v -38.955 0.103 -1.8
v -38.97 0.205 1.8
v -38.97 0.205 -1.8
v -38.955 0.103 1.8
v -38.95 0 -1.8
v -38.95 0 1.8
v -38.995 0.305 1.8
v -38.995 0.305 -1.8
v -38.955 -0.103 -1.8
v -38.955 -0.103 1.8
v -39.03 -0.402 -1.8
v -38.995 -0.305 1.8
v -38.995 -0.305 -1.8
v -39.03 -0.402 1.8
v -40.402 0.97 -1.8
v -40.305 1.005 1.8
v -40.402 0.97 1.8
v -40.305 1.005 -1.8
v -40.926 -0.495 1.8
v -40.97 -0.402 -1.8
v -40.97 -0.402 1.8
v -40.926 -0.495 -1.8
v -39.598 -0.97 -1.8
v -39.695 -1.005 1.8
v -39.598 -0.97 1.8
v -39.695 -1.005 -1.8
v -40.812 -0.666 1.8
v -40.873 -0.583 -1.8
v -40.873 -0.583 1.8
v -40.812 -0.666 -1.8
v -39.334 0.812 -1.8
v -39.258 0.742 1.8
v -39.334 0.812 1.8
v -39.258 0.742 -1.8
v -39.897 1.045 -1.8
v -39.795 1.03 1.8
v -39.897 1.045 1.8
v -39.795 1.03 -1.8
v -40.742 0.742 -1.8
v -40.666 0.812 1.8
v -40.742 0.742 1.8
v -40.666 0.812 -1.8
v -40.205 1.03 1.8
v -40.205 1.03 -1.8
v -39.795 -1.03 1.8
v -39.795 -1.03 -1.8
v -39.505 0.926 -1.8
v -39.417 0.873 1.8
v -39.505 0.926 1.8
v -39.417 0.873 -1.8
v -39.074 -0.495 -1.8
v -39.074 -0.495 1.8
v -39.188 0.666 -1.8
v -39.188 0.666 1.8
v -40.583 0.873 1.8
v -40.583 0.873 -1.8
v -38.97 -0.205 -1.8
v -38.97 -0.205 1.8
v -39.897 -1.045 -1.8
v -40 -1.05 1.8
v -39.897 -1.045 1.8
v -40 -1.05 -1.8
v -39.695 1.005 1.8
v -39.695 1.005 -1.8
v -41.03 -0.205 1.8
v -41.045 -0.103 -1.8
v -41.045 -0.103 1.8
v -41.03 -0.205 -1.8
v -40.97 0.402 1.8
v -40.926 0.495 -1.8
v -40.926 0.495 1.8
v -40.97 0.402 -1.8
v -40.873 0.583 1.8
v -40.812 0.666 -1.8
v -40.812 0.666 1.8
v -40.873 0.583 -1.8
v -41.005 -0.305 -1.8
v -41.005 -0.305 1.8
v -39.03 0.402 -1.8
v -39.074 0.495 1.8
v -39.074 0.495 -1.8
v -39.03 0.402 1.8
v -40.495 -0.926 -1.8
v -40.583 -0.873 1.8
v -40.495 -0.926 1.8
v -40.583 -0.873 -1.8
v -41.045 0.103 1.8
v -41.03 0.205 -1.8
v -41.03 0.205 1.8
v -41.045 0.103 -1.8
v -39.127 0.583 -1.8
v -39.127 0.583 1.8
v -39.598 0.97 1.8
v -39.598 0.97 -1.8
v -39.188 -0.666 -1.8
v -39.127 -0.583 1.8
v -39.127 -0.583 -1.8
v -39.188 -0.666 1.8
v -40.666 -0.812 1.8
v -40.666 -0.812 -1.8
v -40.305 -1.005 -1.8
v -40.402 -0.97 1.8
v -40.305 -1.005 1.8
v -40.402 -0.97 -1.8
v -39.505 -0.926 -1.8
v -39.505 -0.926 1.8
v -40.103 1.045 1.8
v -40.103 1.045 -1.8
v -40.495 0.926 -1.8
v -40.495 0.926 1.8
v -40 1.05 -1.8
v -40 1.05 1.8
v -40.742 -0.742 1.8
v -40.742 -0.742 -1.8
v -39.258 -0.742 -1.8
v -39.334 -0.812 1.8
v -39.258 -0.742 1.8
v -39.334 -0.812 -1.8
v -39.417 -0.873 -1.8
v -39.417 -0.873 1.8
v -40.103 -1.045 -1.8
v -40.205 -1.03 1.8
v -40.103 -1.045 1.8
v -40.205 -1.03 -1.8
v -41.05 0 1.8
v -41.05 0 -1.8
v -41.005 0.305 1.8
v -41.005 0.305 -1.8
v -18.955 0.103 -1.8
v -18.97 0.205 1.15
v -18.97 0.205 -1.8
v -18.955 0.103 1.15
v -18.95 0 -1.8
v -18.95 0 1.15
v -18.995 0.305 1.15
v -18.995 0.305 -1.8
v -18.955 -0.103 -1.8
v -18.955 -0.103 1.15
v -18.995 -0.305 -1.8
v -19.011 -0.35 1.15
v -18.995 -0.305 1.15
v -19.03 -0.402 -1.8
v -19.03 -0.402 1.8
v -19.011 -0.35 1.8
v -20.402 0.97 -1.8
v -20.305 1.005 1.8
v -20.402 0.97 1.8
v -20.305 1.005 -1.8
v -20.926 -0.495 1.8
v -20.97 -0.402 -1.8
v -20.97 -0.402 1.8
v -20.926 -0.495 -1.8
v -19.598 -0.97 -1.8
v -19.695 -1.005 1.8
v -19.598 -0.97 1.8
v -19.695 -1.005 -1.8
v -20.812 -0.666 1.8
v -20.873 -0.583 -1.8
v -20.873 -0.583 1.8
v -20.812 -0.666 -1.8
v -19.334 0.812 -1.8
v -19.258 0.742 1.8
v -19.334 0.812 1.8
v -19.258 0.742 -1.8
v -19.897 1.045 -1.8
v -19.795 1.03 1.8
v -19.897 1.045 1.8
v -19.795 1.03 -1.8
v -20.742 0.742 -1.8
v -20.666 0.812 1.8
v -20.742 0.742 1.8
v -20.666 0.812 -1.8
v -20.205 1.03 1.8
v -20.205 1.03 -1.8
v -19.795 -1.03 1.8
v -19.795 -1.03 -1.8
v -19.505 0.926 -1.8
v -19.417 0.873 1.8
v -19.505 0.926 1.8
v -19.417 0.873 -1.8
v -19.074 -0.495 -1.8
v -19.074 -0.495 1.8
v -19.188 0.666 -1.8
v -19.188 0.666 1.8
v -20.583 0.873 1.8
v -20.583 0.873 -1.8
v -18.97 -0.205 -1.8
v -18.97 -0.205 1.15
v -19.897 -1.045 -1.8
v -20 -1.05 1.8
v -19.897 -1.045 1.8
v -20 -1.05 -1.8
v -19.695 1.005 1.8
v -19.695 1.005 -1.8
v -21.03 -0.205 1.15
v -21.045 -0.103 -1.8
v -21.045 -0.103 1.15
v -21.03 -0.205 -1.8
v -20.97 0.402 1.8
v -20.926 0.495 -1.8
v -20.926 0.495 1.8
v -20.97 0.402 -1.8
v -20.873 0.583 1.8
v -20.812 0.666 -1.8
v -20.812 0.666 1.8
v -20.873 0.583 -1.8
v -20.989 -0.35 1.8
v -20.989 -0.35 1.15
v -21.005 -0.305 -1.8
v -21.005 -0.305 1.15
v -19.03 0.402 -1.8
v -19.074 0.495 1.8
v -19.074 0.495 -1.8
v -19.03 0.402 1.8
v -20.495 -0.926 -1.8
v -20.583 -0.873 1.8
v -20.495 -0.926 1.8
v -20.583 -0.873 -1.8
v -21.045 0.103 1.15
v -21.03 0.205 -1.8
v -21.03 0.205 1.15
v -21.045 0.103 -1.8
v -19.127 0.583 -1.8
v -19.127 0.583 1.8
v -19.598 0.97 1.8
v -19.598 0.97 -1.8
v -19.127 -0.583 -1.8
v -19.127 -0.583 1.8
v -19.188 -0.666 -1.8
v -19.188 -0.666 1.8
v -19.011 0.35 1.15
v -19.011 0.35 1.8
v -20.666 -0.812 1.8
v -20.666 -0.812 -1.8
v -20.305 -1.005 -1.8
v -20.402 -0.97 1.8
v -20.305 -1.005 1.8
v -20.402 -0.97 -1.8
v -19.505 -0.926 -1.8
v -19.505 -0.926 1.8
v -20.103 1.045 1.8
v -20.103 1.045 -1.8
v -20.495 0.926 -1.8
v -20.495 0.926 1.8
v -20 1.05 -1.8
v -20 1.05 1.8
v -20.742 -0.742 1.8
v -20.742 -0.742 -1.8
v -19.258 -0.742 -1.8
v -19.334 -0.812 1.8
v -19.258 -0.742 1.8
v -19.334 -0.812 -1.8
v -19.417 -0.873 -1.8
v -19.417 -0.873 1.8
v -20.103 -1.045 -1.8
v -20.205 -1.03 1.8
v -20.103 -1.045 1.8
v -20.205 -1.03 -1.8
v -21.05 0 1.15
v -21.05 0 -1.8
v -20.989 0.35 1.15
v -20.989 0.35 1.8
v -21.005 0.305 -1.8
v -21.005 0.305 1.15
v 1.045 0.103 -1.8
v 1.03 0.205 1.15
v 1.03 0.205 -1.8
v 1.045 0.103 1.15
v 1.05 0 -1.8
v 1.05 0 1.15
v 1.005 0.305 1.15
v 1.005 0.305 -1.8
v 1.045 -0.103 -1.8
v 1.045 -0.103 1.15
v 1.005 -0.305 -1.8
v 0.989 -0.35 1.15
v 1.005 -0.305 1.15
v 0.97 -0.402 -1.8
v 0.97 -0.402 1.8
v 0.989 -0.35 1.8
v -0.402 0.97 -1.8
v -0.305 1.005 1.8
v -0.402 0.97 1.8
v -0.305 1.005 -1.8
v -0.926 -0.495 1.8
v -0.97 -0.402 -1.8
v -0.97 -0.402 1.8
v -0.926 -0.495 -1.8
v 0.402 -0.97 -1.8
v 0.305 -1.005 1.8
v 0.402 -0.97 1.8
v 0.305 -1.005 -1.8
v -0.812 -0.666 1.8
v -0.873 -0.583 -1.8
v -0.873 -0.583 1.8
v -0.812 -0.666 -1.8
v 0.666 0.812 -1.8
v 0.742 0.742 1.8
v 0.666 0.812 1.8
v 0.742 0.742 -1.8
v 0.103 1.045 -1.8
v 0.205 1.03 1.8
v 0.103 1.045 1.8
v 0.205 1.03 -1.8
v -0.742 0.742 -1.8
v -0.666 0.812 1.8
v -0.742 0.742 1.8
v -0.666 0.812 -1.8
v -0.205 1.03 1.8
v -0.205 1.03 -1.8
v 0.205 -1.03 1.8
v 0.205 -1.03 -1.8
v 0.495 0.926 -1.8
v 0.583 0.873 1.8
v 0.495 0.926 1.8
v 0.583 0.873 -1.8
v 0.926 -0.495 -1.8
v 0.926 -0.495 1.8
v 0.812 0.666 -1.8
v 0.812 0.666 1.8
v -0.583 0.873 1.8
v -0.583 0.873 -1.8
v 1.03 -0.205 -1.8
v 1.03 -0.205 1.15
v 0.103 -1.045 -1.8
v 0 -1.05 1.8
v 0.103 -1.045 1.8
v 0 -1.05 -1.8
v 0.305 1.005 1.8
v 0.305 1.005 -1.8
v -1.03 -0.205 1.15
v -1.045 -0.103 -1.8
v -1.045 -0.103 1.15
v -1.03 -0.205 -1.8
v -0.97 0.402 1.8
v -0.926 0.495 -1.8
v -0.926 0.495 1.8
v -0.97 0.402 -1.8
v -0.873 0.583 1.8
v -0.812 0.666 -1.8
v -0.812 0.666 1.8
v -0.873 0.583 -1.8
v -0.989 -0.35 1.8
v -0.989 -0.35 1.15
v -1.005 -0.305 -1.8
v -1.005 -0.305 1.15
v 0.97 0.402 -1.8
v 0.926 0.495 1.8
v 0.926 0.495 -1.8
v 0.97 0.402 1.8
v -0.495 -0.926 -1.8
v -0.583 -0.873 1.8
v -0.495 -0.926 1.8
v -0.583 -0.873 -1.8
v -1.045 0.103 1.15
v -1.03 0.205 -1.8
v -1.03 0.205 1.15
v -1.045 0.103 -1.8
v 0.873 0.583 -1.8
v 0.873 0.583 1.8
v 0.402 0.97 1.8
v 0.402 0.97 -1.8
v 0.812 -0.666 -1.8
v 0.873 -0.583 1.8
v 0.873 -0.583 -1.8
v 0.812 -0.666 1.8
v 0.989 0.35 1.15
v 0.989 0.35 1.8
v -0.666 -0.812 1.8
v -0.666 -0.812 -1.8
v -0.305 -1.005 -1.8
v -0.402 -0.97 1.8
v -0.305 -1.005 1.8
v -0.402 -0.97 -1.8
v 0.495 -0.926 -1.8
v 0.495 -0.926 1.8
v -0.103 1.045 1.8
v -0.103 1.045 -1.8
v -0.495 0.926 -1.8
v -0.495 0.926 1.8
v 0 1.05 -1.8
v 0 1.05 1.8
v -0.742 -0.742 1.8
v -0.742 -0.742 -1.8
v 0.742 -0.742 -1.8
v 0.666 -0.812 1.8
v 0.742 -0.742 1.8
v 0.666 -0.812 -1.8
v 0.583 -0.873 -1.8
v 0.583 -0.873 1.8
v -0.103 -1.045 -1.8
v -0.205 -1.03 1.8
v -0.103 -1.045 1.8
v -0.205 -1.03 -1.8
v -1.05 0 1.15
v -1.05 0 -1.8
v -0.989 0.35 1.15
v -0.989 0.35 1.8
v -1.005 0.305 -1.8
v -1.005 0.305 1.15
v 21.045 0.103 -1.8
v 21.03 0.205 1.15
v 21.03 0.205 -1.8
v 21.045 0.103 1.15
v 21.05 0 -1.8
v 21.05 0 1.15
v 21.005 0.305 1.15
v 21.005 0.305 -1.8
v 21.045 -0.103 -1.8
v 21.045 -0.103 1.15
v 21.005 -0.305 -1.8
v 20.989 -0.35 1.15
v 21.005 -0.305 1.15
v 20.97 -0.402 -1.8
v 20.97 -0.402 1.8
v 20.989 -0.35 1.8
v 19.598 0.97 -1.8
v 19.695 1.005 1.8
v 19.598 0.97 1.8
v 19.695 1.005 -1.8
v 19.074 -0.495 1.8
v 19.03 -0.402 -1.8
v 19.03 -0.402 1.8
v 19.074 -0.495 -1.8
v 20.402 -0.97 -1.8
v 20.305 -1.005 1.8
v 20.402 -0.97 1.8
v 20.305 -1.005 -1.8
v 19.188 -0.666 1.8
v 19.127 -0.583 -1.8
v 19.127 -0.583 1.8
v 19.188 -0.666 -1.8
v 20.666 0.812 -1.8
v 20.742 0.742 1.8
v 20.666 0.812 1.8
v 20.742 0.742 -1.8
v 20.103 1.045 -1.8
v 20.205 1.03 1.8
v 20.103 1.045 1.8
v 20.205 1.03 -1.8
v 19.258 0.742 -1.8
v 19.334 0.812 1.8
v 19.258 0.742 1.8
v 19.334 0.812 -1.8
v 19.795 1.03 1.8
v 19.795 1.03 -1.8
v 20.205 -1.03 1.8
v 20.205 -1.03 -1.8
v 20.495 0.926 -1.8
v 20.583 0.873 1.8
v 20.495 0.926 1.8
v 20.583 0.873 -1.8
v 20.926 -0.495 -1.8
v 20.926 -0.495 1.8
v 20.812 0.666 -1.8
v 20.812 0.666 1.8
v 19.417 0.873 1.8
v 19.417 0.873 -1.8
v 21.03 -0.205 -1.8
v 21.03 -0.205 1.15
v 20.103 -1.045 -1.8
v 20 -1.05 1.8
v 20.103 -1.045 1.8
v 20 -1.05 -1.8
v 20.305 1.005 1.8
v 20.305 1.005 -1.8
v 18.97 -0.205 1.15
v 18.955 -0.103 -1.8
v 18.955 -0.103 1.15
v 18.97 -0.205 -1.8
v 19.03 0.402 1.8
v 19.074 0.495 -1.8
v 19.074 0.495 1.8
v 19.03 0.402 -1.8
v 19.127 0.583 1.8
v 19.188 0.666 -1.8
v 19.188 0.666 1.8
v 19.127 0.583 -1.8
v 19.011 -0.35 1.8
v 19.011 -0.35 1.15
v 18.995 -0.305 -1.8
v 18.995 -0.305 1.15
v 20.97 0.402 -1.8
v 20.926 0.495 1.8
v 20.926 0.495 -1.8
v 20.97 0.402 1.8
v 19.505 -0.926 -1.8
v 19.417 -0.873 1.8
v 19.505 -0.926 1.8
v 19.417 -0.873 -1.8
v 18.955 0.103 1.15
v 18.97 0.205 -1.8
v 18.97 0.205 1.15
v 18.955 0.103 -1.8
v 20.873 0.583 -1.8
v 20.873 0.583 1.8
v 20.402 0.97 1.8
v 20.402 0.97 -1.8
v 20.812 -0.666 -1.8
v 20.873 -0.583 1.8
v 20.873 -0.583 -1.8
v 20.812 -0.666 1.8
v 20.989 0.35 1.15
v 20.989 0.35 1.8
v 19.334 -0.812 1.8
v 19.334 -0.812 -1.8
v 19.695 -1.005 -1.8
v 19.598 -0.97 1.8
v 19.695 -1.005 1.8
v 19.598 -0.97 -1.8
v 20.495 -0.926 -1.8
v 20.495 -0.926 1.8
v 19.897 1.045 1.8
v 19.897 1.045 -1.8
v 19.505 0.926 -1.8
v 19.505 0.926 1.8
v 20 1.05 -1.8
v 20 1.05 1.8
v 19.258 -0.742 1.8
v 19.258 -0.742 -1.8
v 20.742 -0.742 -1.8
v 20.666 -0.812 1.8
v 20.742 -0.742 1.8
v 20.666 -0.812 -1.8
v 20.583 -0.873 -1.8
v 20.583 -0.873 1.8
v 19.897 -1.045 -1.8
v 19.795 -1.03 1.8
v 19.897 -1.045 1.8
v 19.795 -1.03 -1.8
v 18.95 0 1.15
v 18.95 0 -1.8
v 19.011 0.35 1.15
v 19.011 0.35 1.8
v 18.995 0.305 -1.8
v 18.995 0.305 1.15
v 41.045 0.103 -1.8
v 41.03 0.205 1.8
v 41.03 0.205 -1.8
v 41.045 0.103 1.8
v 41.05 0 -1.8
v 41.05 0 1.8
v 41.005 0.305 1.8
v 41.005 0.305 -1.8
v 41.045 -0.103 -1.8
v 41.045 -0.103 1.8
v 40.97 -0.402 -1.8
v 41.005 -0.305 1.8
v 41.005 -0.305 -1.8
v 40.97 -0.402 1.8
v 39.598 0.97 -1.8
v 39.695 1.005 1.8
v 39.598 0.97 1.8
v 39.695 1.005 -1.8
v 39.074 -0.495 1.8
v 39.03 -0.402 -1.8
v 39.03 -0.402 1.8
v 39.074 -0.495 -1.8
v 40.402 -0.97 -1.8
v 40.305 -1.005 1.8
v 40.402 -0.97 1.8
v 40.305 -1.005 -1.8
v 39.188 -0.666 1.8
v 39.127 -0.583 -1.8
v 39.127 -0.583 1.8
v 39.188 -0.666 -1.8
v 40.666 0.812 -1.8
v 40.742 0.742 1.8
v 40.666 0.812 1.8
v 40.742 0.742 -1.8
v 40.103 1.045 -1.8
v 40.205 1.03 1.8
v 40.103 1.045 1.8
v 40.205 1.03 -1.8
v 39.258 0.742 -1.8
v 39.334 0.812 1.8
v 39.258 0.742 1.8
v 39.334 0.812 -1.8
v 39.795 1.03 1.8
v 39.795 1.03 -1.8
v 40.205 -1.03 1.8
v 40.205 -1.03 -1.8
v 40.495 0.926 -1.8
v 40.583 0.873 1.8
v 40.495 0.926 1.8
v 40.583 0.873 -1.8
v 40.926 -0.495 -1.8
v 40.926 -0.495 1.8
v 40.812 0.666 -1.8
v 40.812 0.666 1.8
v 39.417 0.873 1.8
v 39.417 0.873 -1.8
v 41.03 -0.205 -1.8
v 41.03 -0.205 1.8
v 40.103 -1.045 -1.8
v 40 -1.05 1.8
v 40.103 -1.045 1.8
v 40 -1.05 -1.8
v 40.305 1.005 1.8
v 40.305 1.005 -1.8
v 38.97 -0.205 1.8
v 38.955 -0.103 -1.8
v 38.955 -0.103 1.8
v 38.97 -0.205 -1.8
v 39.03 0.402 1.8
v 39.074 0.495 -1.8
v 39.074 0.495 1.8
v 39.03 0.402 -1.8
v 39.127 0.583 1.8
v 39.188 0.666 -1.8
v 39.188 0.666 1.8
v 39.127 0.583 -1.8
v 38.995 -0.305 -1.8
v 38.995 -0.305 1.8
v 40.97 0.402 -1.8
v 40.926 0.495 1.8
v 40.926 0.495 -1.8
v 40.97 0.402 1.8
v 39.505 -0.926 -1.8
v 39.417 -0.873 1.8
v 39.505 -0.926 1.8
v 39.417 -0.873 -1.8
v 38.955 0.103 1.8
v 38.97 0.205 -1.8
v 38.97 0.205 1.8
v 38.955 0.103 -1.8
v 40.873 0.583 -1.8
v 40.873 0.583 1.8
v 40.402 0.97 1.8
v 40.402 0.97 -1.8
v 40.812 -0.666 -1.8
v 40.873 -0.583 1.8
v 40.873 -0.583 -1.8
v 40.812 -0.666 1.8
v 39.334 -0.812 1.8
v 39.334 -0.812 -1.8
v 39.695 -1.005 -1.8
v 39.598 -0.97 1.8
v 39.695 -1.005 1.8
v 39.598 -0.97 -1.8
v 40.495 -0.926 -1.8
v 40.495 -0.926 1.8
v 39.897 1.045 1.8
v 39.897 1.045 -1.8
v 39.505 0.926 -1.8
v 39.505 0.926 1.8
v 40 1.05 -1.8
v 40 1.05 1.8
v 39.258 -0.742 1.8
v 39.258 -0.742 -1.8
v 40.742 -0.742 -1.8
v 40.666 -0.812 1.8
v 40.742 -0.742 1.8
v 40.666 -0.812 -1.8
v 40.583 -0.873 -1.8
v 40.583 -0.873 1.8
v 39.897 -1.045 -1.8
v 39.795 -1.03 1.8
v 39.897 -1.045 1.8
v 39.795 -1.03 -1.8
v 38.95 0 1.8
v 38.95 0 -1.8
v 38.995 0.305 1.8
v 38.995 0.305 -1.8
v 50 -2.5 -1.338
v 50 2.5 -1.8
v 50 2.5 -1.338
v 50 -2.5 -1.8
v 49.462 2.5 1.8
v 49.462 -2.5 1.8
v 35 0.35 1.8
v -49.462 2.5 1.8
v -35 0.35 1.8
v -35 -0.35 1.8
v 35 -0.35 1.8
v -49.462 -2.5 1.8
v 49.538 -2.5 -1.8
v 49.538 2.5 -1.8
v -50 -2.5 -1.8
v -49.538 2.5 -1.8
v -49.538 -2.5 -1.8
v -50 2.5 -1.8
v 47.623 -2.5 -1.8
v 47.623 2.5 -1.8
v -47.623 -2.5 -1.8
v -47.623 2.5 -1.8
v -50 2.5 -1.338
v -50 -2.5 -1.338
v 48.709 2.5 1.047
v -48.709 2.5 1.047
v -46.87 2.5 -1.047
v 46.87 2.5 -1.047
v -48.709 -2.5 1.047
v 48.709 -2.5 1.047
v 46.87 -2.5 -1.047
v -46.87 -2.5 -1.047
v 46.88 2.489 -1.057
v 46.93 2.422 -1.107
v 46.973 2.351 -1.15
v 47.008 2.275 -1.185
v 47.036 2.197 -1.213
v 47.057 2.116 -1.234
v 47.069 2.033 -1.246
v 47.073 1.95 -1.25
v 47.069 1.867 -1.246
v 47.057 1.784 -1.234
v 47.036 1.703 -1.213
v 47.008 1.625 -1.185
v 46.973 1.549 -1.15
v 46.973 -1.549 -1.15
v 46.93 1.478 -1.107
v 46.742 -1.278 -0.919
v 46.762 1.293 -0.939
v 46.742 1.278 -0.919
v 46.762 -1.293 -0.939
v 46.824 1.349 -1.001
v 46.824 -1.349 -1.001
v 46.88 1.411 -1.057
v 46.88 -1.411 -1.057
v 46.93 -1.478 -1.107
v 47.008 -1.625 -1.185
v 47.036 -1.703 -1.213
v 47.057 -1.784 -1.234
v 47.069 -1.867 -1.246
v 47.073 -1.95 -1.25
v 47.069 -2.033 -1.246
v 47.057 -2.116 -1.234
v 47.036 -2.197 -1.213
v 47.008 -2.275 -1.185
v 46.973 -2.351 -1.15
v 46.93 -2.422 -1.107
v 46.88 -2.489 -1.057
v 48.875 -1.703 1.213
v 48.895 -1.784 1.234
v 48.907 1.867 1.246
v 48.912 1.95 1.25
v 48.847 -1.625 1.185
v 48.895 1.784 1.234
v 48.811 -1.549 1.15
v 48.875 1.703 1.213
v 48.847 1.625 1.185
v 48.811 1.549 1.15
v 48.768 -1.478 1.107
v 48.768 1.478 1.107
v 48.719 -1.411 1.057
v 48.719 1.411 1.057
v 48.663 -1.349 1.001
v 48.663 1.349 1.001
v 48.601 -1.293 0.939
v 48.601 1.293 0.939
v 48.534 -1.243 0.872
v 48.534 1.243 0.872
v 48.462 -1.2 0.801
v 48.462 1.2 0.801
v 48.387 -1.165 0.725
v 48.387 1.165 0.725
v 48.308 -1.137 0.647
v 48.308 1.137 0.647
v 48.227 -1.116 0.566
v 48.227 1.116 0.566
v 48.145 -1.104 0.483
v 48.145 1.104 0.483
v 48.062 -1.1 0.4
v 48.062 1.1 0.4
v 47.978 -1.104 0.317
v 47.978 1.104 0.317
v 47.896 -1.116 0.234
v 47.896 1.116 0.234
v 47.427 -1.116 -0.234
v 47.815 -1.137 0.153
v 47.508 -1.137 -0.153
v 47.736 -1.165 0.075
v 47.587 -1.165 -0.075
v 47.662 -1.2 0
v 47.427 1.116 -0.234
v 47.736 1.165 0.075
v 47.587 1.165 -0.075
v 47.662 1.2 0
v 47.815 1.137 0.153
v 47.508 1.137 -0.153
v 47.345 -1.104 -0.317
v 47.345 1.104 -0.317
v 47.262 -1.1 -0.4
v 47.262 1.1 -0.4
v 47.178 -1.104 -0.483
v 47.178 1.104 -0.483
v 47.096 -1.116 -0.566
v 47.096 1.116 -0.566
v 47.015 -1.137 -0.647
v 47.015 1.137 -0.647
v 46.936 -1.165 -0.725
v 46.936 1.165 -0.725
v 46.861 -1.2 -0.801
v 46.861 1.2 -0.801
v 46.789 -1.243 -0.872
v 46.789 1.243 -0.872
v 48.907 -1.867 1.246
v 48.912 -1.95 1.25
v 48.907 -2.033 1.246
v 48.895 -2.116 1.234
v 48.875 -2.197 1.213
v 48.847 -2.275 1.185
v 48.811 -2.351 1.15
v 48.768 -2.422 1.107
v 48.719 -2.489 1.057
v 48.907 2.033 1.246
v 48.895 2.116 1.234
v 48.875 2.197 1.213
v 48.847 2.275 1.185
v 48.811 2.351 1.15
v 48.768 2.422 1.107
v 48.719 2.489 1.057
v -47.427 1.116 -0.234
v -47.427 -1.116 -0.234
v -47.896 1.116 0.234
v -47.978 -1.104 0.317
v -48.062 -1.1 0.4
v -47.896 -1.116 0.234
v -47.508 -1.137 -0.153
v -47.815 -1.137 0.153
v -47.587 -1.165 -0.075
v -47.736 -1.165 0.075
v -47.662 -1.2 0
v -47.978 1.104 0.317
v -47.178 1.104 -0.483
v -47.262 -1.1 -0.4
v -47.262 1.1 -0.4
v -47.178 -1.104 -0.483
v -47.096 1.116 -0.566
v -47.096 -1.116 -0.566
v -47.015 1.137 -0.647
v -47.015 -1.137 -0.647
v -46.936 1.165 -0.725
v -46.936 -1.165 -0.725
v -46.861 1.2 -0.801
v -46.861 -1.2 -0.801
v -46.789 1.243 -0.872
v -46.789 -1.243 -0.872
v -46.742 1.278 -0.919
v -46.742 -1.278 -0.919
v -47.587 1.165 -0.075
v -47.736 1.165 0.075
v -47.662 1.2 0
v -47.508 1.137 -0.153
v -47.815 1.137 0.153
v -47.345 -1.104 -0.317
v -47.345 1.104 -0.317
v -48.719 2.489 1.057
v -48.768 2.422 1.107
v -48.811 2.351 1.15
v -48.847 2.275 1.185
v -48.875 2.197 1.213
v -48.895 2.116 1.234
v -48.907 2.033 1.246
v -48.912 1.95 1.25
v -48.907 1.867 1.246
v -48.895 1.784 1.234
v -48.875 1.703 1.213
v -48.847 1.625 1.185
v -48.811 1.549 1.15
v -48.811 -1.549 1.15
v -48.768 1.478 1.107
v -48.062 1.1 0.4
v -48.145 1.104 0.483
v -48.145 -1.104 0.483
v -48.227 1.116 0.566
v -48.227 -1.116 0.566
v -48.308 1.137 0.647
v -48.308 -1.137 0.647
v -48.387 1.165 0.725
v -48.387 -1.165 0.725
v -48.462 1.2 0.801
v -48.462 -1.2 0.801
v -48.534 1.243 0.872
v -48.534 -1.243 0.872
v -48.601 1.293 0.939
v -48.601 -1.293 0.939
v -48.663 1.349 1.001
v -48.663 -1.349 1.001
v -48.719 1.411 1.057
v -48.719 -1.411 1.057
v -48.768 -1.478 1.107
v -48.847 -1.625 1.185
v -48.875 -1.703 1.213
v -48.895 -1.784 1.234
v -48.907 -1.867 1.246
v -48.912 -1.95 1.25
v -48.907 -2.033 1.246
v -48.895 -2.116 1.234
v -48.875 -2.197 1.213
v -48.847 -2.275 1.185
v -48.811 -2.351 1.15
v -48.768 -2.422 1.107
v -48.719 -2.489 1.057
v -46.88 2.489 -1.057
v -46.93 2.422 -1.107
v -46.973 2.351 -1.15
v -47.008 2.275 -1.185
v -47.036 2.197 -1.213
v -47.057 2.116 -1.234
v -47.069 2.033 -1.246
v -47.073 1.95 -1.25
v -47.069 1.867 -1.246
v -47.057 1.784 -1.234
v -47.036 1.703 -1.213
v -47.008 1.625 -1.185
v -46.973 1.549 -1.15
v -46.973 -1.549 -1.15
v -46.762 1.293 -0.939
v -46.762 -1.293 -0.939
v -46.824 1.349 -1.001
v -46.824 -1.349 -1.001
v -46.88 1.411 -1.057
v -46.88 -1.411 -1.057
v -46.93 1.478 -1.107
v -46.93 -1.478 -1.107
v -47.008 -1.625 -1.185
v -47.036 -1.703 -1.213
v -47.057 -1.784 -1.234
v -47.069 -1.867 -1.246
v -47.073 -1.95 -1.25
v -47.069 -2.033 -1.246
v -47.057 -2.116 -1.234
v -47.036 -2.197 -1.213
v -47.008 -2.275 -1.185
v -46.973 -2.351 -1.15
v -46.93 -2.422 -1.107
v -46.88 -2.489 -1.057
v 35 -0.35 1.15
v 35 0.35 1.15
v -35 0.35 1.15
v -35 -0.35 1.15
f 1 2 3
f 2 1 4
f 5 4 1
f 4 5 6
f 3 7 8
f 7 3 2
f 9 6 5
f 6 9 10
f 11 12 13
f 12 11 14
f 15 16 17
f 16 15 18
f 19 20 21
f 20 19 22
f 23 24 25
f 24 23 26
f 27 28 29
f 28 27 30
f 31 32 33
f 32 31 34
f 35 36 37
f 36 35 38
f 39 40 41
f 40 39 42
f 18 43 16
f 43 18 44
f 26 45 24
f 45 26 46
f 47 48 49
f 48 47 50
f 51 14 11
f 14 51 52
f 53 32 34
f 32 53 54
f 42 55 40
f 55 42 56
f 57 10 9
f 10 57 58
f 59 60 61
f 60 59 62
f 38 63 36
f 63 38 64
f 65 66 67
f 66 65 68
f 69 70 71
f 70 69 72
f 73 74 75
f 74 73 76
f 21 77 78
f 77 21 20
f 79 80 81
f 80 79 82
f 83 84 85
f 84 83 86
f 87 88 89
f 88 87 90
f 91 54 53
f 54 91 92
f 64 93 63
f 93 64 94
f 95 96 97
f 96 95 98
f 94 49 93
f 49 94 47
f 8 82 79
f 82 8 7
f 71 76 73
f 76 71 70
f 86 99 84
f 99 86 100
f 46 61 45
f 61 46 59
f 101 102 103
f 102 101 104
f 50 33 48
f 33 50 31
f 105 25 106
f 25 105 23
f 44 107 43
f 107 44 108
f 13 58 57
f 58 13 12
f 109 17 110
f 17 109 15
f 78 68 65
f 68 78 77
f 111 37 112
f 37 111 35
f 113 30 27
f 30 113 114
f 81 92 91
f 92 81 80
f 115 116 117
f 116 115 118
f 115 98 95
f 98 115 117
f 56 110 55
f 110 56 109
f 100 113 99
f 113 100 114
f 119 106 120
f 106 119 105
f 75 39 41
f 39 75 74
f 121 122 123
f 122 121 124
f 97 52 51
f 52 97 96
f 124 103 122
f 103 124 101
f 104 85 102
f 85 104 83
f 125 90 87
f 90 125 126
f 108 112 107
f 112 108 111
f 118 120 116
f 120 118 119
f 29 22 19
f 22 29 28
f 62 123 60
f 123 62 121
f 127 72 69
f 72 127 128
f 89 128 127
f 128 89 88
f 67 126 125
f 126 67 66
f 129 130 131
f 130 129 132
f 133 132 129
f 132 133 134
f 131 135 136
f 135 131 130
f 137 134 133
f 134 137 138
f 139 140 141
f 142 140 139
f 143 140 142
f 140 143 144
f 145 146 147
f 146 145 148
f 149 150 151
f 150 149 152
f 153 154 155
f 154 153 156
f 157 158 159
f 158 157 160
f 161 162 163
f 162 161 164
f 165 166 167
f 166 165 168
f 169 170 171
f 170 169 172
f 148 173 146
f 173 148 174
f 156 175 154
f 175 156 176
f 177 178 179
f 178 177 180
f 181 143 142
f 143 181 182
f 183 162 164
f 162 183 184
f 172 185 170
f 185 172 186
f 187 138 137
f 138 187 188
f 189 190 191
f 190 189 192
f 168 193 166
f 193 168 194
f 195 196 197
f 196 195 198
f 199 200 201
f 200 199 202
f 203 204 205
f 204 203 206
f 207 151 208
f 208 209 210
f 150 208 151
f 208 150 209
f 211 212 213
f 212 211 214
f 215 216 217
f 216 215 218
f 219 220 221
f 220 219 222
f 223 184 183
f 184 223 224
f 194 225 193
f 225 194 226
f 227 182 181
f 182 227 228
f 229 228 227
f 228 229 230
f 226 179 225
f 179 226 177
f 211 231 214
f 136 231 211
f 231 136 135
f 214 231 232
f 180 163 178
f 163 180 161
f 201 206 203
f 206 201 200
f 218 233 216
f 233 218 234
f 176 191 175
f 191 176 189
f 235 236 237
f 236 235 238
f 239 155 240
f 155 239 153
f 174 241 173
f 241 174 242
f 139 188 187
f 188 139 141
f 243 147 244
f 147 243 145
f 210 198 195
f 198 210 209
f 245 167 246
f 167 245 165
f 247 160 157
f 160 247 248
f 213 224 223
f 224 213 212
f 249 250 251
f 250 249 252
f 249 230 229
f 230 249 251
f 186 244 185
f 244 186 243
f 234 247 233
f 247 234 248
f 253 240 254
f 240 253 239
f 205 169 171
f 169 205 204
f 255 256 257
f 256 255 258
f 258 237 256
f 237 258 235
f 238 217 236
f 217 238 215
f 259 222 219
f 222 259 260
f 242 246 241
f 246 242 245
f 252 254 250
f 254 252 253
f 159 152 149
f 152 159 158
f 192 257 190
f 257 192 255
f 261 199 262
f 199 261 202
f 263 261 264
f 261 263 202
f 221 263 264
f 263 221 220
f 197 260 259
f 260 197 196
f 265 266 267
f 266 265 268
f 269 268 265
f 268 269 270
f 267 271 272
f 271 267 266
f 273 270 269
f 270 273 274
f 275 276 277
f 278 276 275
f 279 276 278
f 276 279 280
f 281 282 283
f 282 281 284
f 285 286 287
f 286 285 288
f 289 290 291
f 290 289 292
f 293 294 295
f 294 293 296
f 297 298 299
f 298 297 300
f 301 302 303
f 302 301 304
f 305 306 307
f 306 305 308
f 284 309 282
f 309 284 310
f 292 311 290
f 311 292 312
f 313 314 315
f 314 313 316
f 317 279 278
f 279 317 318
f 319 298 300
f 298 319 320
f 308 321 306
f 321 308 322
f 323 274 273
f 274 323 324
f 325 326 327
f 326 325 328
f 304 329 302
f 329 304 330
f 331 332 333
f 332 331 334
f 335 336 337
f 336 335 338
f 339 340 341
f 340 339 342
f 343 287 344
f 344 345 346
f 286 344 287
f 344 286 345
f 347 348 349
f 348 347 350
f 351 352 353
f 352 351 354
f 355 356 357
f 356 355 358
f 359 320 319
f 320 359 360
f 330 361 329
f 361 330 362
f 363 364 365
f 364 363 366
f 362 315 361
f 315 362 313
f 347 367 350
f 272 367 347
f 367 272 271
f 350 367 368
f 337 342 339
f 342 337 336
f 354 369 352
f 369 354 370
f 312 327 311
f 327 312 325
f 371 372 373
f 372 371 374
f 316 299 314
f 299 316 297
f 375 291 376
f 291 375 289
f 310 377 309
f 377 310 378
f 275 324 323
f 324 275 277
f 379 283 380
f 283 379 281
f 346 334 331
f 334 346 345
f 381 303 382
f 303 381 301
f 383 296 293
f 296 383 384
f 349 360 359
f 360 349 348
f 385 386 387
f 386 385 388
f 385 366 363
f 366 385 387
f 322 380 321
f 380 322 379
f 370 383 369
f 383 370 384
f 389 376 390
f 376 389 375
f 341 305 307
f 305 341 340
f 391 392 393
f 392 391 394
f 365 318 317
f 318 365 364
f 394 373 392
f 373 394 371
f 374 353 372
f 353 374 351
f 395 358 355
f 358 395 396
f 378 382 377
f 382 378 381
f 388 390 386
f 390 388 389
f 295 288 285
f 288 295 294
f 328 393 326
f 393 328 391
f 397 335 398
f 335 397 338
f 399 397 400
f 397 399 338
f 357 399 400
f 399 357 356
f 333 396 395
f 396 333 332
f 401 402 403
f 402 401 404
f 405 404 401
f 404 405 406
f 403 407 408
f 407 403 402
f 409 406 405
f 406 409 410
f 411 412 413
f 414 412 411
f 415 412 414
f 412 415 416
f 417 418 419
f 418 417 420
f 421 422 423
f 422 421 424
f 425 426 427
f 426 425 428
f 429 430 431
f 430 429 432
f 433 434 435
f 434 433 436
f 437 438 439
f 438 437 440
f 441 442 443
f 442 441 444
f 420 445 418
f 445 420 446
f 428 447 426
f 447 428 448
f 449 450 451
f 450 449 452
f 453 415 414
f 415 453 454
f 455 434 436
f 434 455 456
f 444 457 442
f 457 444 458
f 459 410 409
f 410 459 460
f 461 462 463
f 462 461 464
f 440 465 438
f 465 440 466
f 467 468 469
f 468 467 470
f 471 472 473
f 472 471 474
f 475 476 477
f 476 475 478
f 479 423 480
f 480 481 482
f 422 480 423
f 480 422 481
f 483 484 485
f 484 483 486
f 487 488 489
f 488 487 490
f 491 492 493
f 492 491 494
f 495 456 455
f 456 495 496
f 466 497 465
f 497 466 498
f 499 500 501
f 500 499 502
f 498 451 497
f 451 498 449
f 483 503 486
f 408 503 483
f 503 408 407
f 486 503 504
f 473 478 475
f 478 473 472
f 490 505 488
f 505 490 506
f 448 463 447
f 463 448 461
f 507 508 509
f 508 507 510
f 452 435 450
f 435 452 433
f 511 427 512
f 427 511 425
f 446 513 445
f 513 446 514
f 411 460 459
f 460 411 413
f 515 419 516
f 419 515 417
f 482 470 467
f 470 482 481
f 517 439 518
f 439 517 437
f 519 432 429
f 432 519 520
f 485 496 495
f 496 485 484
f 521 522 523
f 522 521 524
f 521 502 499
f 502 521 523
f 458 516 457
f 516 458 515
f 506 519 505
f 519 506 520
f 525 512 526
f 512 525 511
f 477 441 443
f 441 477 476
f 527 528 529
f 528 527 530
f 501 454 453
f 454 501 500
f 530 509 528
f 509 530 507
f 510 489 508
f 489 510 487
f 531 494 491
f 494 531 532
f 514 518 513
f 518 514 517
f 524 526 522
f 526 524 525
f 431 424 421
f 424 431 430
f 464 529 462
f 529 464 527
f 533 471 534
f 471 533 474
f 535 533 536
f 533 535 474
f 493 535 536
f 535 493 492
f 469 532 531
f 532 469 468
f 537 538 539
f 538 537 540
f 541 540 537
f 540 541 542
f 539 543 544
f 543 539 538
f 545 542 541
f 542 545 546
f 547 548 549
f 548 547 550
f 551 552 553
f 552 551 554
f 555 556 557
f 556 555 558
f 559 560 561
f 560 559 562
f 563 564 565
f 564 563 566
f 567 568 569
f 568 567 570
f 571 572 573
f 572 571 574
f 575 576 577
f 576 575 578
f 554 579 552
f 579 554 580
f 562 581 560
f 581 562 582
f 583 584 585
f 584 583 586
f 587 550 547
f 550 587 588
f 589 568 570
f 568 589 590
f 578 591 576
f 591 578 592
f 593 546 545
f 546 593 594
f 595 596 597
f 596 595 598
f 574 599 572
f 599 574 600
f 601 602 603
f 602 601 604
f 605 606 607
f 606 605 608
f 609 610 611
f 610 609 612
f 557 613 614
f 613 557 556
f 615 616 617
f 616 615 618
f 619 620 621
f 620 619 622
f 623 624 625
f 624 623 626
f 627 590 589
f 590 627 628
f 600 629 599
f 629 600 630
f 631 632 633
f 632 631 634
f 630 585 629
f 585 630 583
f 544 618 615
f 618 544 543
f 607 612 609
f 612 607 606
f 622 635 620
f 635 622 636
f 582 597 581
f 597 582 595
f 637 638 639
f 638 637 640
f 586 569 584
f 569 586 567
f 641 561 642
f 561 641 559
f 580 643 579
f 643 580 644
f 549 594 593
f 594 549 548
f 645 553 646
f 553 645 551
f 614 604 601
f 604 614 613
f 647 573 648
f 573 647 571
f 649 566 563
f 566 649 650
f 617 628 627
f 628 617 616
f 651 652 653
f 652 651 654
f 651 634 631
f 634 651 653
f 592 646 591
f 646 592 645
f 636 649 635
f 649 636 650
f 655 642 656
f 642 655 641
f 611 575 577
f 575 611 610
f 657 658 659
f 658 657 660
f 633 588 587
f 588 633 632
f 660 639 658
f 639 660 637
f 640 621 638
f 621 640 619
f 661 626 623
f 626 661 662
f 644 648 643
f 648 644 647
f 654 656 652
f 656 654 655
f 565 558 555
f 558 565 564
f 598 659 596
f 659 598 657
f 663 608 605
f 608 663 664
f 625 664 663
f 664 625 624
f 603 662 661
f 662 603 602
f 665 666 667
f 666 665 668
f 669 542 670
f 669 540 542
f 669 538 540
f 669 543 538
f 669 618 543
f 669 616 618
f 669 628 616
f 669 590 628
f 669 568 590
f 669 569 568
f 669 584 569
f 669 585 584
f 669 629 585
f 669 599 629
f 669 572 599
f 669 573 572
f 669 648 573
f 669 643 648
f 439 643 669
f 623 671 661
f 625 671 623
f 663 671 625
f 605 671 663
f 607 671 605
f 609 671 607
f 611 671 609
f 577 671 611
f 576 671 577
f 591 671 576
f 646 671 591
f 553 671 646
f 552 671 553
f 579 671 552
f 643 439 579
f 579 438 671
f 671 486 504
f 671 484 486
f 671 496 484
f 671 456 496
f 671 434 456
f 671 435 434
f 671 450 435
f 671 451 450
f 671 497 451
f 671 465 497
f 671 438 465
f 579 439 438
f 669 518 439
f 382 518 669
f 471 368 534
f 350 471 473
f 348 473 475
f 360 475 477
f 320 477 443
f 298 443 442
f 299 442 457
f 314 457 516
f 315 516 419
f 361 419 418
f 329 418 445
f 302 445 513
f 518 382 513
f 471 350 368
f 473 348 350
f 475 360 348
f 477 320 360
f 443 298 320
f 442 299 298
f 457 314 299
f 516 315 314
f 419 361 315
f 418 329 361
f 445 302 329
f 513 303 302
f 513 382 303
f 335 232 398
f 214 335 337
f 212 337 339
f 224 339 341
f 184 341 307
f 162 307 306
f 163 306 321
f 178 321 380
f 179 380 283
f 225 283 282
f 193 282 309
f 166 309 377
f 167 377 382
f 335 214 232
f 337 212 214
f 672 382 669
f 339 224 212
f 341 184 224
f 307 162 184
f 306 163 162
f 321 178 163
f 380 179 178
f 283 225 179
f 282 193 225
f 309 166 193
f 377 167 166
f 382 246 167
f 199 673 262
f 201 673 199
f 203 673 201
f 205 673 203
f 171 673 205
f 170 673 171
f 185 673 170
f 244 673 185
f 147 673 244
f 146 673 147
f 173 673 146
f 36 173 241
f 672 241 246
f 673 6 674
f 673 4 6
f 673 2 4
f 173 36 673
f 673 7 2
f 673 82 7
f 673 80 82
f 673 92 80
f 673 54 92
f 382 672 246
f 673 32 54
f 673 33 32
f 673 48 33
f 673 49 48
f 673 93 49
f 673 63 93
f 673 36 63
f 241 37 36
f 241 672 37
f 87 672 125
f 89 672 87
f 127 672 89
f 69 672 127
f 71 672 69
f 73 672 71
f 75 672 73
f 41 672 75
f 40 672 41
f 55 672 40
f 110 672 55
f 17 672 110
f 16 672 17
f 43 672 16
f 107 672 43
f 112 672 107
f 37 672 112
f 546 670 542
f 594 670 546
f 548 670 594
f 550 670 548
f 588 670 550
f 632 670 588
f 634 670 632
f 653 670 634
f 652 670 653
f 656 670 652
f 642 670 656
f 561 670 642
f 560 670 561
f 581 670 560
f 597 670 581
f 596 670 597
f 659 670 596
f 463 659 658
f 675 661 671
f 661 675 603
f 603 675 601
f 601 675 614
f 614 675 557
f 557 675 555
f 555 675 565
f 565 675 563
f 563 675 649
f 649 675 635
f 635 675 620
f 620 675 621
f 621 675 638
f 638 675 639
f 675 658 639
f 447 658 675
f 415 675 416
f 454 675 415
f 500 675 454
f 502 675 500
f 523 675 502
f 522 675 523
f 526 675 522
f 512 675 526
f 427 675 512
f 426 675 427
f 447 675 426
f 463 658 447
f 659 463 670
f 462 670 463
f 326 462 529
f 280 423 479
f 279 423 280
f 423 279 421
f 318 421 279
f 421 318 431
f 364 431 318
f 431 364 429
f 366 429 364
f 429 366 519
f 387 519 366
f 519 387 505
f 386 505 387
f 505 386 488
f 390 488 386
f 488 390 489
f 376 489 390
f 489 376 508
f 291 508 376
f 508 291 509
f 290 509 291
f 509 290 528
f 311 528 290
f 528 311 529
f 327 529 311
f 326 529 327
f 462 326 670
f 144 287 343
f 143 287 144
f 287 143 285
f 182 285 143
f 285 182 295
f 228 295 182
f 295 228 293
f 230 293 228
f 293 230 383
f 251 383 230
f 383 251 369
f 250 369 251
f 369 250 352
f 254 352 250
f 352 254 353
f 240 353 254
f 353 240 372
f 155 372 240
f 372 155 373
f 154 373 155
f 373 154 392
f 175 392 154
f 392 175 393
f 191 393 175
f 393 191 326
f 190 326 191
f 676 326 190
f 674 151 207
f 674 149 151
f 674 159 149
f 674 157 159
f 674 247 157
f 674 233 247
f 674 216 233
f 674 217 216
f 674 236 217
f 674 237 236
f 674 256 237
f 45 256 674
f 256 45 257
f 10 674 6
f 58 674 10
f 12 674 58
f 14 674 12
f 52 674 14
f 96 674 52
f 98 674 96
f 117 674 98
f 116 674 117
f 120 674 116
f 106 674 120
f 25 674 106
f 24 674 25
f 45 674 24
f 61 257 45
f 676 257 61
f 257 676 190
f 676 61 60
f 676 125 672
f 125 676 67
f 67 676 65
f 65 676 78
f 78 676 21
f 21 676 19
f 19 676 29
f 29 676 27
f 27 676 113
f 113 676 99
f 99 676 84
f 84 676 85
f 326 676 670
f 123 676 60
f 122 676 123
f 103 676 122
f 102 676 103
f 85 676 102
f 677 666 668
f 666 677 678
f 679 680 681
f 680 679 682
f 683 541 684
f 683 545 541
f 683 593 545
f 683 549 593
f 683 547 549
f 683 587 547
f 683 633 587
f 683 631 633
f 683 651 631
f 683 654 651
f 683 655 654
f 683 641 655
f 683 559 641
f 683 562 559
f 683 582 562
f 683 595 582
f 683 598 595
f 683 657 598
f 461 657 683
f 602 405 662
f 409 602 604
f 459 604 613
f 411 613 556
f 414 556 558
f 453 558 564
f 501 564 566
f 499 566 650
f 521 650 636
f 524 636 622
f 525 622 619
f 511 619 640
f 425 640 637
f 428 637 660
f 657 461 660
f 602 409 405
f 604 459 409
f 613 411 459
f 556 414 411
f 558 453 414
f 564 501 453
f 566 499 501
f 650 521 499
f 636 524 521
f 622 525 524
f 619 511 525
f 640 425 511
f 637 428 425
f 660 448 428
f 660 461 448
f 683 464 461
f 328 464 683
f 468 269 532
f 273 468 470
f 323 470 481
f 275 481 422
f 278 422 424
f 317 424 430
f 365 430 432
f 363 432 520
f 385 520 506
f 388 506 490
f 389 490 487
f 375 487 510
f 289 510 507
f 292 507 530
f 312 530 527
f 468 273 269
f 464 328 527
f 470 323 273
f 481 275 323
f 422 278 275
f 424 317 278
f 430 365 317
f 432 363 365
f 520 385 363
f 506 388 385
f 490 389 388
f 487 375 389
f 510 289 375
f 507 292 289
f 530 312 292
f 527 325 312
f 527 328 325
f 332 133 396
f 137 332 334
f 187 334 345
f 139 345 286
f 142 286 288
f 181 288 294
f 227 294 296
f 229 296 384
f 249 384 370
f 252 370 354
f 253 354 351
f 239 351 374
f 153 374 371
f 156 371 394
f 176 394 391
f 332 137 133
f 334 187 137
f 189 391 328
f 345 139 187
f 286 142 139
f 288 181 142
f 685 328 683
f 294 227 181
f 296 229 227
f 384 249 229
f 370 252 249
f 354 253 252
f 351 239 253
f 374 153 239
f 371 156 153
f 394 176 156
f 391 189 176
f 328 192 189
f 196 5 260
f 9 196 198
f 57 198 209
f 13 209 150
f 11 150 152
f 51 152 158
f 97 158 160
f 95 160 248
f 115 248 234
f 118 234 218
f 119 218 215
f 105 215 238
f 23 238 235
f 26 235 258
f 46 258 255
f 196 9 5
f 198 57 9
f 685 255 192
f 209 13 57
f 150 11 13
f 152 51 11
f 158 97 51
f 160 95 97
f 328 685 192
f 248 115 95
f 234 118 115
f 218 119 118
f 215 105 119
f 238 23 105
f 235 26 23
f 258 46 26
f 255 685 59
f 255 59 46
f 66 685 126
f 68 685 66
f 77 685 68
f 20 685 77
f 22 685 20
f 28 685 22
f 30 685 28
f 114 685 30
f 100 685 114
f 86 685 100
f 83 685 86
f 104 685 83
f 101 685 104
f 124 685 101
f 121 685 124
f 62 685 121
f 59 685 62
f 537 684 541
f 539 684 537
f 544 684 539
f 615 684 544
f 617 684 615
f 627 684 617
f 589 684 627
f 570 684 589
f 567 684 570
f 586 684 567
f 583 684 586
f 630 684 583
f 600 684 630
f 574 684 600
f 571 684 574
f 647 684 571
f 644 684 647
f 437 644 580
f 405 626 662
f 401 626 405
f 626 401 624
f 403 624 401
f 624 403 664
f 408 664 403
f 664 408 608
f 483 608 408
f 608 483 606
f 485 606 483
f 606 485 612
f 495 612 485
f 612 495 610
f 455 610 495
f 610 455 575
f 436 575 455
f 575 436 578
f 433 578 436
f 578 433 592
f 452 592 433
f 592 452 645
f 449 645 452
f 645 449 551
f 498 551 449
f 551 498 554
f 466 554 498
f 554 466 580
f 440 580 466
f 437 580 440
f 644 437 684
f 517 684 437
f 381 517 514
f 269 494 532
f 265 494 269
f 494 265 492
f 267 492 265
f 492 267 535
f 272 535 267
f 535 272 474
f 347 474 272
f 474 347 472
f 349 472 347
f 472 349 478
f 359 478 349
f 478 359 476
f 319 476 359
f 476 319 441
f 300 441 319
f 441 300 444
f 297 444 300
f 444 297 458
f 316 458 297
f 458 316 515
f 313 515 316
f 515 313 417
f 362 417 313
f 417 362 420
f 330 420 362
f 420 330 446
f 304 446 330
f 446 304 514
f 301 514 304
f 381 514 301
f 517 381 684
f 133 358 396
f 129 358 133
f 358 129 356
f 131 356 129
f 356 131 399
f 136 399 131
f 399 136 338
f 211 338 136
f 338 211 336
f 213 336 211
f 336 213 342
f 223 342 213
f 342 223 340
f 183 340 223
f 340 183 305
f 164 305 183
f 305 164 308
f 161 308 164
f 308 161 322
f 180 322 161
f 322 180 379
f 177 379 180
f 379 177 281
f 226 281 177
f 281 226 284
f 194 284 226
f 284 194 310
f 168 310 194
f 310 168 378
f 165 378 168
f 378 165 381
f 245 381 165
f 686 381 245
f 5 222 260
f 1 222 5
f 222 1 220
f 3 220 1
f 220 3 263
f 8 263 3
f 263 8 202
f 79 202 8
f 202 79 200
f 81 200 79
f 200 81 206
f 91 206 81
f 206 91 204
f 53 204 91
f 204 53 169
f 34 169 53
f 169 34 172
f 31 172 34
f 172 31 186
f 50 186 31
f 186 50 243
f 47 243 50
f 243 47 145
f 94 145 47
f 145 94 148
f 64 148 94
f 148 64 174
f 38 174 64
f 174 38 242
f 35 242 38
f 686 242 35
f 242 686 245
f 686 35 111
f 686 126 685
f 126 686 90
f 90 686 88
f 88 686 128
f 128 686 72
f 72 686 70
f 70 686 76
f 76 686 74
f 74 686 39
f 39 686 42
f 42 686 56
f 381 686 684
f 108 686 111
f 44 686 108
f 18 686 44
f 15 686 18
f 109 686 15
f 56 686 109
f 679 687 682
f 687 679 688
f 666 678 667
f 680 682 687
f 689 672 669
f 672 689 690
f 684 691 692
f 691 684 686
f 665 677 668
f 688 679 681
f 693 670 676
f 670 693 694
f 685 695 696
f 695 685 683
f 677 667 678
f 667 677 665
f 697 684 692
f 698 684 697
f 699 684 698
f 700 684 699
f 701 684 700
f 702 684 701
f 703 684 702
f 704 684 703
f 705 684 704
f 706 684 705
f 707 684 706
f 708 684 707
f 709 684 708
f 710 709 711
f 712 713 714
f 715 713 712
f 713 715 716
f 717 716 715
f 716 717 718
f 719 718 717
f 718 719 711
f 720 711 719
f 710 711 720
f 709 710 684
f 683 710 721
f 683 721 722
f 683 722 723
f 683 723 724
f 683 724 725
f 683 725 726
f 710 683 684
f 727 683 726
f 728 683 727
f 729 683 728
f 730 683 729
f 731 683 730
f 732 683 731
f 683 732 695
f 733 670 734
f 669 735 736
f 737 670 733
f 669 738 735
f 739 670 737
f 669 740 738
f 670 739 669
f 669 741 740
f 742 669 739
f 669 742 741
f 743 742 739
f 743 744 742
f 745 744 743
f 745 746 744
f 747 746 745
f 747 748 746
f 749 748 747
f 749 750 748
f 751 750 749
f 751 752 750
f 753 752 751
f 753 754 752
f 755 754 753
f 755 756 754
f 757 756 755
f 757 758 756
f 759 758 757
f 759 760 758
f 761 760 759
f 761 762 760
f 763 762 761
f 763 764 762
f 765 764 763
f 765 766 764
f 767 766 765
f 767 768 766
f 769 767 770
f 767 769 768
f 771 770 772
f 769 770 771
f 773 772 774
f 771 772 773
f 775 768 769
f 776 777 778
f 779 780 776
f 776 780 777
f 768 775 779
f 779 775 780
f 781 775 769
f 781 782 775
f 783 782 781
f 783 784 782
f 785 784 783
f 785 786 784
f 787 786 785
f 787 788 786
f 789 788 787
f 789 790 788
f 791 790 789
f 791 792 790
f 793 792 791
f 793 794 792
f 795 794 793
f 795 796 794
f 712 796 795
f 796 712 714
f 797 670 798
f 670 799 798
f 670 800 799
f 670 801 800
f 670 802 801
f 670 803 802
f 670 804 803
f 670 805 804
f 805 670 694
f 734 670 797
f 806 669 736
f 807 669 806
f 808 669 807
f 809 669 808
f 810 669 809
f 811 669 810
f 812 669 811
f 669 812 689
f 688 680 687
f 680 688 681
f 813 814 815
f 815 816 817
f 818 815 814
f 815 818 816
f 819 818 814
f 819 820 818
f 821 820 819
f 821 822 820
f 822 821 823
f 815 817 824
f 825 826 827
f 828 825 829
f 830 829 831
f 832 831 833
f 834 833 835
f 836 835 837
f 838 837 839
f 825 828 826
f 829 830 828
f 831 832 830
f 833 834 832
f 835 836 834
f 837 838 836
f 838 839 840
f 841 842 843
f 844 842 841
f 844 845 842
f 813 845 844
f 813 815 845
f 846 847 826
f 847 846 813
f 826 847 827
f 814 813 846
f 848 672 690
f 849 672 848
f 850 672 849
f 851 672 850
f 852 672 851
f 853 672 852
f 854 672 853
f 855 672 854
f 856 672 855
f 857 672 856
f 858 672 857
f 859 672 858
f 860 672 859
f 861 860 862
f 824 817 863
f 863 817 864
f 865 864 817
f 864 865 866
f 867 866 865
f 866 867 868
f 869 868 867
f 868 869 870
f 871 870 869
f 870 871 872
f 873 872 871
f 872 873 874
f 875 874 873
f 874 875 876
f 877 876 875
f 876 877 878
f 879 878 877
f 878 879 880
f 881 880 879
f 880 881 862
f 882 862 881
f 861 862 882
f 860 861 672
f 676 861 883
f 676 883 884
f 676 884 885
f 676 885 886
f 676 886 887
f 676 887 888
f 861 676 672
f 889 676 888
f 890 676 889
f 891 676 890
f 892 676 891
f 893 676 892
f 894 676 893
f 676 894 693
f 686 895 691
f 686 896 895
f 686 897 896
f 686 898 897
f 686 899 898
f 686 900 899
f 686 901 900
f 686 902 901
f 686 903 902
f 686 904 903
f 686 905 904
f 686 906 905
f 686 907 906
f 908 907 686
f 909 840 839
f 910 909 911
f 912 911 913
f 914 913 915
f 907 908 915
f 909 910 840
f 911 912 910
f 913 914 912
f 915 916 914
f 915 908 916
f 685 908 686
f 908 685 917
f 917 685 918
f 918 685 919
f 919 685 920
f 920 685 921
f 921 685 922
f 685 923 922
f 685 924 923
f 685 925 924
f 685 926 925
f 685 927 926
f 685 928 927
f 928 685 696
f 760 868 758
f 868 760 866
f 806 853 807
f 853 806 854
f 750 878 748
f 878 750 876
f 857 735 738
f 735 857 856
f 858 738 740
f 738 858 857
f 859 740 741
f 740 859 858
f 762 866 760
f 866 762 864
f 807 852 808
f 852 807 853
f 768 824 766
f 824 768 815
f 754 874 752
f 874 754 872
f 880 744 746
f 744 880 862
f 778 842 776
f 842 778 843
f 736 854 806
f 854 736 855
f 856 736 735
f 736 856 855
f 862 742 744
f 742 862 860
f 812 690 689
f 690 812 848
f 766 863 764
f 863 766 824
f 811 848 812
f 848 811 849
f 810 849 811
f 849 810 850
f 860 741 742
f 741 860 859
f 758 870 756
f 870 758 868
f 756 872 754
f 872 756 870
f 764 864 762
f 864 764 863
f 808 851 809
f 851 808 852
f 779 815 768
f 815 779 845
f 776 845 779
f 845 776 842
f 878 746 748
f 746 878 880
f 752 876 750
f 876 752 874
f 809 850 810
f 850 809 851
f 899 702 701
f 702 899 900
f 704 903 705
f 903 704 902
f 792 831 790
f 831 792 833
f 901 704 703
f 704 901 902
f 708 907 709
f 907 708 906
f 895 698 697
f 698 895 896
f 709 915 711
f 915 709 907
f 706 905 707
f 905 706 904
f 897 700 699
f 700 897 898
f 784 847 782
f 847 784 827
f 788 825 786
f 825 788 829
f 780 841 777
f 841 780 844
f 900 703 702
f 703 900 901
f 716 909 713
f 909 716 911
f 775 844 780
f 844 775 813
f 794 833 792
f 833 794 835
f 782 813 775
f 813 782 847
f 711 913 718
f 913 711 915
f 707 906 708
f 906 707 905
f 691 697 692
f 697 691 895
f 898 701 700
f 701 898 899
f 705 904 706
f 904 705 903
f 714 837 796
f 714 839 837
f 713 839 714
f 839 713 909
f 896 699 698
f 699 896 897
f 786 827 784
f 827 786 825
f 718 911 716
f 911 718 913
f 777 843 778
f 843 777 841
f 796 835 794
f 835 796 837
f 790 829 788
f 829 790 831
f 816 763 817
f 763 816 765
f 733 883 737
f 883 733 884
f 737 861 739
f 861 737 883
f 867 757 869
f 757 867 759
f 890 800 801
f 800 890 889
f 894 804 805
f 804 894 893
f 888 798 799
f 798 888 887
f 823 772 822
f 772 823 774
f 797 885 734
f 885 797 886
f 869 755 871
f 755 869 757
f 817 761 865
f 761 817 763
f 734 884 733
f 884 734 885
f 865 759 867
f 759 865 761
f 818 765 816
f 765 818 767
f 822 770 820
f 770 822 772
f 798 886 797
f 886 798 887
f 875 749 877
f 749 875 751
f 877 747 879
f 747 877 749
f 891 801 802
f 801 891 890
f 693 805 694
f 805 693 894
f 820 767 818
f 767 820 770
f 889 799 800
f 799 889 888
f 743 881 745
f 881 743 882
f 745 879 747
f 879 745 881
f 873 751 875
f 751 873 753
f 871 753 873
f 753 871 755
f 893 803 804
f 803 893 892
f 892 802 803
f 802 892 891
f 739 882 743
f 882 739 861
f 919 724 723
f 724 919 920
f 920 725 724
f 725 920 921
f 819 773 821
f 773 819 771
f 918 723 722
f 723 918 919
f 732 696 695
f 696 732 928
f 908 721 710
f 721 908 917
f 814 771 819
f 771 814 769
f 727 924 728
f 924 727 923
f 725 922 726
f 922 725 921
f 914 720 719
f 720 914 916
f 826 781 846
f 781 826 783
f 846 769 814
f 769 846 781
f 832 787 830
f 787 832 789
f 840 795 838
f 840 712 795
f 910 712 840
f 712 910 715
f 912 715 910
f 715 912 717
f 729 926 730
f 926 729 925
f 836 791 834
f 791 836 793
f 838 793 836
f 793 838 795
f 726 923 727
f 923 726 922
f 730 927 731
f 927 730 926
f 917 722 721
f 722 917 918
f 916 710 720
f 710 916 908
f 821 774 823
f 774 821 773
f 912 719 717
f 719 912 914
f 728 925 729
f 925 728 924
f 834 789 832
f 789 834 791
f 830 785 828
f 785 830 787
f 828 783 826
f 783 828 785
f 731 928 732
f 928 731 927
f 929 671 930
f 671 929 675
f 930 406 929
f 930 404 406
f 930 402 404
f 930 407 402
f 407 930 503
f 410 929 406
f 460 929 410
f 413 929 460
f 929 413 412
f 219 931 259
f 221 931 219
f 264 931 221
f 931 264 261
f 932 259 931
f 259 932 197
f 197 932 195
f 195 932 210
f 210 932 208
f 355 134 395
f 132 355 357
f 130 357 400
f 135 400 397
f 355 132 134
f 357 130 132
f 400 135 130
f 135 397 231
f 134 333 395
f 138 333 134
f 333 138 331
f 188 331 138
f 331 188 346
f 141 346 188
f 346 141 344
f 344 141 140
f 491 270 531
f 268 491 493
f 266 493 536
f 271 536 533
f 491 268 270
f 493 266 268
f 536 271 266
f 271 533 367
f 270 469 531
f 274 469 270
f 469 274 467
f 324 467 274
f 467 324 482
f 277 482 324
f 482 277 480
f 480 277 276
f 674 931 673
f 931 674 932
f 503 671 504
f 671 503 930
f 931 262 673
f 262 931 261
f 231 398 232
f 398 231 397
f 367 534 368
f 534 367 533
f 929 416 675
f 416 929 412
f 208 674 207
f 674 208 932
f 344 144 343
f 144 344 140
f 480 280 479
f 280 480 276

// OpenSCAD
// Miniature linear guide rail (single connected solid)
// Target overall size: 100.0mm (L) x 5.0mm (W) x 3.6mm (H)

$fn = 64;

// Parameters
rail_L = 100.0; //[50.0:200.0:1]
rail_W = 5.0;   //[2.5:10.0:0.1]
rail_H = 3.6;   //[1.8:7.2:0.1]

// Mounting holes
hole_d = 2.0;                 //[1.0:4.0:0.1]
hole_pitch = 20.0;            //[10.0:40.0:1]
hole_edge_offset = 10.0;      //[5.0:20.0:1]
hole_count = 5;               //[2:9:1]
hole_clearance_factor = 1.05; //[1.0:1.2:0.01]

// Profile details (subtractive)
race_r = 0.85;        //[0.4:1.2:0.05]  // side raceway radius
race_depth = 0.55;    //[0.2:1.0:0.05]  // how far into the side
race_z = 0.55;        //[0.2:1.2:0.05]  // vertical offset from top/bottom edges

// End chamfers (subtractive)
end_chamfer_L = 1.0;  //[0.3:2.0:0.1]

// Small top relief groove (subtractive)
top_groove_W = 0.7;   //[0.2:1.5:0.05]
top_groove_D = 0.25;  //[0.05:0.6:0.05]
top_groove_L = 70.0;  //[20.0:120.0:1]

// Robust boolean overlap
overlap = 0.8; //[0.5:2.0:0.1]

// ---------- Helpers ----------
function clamp(v, lo, hi) = v < lo ? lo : (v > hi ? hi : v);

// Ensure grooves don't exceed rail bounds
race_r_eff     = clamp(race_r, 0.05, rail_H/2 - 0.05);
race_depth_eff = clamp(race_depth, 0.05, rail_W/2 - 0.05);
race_z_eff     = clamp(race_z, 0.05, rail_H/2 - race_r_eff - 0.05);

top_groove_W_eff = clamp(top_groove_W, 0.05, rail_W - 0.2);
top_groove_D_eff = clamp(top_groove_D, 0.01, rail_H/2 - 0.05);
top_groove_L_eff = clamp(top_groove_L, 1, rail_L - 2*end_chamfer_L - 0.2);

// ---------- Base body ----------
module rail_body() {
    cube([rail_L, rail_W, rail_H], center=true);
}

// Through mounting hole at x
module mounting_hole(x_offset) {
    translate([x_offset, 0, 0])
        cylinder(h=rail_H + 2*overlap,
                 r=(hole_d*hole_clearance_factor)/2,
                 center=true);
}

// End chamfer cut (45° wedge) at +/- end
module end_chamfer(sign=1) {
    // Place a rotated cutting block so it intersects the end
    // sign=+1 for +X end, sign=-1 for -X end
    translate([sign*(rail_L/2 - end_chamfer_L/2), 0, 0])
        rotate([0, sign*45, 0])
            cube([end_chamfer_L + 2*overlap, rail_W + 2*overlap, rail_H + 2*overlap], center=true);
}

// Side raceway cut: cylinder along X, offset to bite into side
module side_raceway(side=1, zpos=1) {
    // side: +1 for +Y side, -1 for -Y side
    // zpos: +1 near top, -1 near bottom
    translate([0,
               side*(rail_W/2 - race_depth_eff),
               zpos*(rail_H/2 - race_z_eff - race_r_eff)])
        rotate([0, 90, 0])
            cylinder(h=rail_L + 2*overlap, r=race_r_eff, center=true);
}

// Top relief groove (shallow rectangular groove)
module top_relief_groove() {
    translate([0, 0, rail_H/2 - top_groove_D_eff/2])
        cube([top_groove_L_eff, top_groove_W_eff, top_groove_D_eff + overlap], center=true);
}

// ---------- Complete model ----------
module complete_model() {
    difference() {
        rail_body();

        // Holes
        for (i = [0:hole_count-1]) {
            mounting_hole(-rail_L/2 + hole_edge_offset + i*hole_pitch);
        }

        // End chamfers
        end_chamfer(+1);
        end_chamfer(-1);

        // Raceway details (4 grooves: two per side, top/bottom)
        side_raceway(+1, +1);
        side_raceway(+1, -1);
        side_raceway(-1, +1);
        side_raceway(-1, -1);

        // Small top groove
        top_relief_groove();
    }
}

complete_model();
